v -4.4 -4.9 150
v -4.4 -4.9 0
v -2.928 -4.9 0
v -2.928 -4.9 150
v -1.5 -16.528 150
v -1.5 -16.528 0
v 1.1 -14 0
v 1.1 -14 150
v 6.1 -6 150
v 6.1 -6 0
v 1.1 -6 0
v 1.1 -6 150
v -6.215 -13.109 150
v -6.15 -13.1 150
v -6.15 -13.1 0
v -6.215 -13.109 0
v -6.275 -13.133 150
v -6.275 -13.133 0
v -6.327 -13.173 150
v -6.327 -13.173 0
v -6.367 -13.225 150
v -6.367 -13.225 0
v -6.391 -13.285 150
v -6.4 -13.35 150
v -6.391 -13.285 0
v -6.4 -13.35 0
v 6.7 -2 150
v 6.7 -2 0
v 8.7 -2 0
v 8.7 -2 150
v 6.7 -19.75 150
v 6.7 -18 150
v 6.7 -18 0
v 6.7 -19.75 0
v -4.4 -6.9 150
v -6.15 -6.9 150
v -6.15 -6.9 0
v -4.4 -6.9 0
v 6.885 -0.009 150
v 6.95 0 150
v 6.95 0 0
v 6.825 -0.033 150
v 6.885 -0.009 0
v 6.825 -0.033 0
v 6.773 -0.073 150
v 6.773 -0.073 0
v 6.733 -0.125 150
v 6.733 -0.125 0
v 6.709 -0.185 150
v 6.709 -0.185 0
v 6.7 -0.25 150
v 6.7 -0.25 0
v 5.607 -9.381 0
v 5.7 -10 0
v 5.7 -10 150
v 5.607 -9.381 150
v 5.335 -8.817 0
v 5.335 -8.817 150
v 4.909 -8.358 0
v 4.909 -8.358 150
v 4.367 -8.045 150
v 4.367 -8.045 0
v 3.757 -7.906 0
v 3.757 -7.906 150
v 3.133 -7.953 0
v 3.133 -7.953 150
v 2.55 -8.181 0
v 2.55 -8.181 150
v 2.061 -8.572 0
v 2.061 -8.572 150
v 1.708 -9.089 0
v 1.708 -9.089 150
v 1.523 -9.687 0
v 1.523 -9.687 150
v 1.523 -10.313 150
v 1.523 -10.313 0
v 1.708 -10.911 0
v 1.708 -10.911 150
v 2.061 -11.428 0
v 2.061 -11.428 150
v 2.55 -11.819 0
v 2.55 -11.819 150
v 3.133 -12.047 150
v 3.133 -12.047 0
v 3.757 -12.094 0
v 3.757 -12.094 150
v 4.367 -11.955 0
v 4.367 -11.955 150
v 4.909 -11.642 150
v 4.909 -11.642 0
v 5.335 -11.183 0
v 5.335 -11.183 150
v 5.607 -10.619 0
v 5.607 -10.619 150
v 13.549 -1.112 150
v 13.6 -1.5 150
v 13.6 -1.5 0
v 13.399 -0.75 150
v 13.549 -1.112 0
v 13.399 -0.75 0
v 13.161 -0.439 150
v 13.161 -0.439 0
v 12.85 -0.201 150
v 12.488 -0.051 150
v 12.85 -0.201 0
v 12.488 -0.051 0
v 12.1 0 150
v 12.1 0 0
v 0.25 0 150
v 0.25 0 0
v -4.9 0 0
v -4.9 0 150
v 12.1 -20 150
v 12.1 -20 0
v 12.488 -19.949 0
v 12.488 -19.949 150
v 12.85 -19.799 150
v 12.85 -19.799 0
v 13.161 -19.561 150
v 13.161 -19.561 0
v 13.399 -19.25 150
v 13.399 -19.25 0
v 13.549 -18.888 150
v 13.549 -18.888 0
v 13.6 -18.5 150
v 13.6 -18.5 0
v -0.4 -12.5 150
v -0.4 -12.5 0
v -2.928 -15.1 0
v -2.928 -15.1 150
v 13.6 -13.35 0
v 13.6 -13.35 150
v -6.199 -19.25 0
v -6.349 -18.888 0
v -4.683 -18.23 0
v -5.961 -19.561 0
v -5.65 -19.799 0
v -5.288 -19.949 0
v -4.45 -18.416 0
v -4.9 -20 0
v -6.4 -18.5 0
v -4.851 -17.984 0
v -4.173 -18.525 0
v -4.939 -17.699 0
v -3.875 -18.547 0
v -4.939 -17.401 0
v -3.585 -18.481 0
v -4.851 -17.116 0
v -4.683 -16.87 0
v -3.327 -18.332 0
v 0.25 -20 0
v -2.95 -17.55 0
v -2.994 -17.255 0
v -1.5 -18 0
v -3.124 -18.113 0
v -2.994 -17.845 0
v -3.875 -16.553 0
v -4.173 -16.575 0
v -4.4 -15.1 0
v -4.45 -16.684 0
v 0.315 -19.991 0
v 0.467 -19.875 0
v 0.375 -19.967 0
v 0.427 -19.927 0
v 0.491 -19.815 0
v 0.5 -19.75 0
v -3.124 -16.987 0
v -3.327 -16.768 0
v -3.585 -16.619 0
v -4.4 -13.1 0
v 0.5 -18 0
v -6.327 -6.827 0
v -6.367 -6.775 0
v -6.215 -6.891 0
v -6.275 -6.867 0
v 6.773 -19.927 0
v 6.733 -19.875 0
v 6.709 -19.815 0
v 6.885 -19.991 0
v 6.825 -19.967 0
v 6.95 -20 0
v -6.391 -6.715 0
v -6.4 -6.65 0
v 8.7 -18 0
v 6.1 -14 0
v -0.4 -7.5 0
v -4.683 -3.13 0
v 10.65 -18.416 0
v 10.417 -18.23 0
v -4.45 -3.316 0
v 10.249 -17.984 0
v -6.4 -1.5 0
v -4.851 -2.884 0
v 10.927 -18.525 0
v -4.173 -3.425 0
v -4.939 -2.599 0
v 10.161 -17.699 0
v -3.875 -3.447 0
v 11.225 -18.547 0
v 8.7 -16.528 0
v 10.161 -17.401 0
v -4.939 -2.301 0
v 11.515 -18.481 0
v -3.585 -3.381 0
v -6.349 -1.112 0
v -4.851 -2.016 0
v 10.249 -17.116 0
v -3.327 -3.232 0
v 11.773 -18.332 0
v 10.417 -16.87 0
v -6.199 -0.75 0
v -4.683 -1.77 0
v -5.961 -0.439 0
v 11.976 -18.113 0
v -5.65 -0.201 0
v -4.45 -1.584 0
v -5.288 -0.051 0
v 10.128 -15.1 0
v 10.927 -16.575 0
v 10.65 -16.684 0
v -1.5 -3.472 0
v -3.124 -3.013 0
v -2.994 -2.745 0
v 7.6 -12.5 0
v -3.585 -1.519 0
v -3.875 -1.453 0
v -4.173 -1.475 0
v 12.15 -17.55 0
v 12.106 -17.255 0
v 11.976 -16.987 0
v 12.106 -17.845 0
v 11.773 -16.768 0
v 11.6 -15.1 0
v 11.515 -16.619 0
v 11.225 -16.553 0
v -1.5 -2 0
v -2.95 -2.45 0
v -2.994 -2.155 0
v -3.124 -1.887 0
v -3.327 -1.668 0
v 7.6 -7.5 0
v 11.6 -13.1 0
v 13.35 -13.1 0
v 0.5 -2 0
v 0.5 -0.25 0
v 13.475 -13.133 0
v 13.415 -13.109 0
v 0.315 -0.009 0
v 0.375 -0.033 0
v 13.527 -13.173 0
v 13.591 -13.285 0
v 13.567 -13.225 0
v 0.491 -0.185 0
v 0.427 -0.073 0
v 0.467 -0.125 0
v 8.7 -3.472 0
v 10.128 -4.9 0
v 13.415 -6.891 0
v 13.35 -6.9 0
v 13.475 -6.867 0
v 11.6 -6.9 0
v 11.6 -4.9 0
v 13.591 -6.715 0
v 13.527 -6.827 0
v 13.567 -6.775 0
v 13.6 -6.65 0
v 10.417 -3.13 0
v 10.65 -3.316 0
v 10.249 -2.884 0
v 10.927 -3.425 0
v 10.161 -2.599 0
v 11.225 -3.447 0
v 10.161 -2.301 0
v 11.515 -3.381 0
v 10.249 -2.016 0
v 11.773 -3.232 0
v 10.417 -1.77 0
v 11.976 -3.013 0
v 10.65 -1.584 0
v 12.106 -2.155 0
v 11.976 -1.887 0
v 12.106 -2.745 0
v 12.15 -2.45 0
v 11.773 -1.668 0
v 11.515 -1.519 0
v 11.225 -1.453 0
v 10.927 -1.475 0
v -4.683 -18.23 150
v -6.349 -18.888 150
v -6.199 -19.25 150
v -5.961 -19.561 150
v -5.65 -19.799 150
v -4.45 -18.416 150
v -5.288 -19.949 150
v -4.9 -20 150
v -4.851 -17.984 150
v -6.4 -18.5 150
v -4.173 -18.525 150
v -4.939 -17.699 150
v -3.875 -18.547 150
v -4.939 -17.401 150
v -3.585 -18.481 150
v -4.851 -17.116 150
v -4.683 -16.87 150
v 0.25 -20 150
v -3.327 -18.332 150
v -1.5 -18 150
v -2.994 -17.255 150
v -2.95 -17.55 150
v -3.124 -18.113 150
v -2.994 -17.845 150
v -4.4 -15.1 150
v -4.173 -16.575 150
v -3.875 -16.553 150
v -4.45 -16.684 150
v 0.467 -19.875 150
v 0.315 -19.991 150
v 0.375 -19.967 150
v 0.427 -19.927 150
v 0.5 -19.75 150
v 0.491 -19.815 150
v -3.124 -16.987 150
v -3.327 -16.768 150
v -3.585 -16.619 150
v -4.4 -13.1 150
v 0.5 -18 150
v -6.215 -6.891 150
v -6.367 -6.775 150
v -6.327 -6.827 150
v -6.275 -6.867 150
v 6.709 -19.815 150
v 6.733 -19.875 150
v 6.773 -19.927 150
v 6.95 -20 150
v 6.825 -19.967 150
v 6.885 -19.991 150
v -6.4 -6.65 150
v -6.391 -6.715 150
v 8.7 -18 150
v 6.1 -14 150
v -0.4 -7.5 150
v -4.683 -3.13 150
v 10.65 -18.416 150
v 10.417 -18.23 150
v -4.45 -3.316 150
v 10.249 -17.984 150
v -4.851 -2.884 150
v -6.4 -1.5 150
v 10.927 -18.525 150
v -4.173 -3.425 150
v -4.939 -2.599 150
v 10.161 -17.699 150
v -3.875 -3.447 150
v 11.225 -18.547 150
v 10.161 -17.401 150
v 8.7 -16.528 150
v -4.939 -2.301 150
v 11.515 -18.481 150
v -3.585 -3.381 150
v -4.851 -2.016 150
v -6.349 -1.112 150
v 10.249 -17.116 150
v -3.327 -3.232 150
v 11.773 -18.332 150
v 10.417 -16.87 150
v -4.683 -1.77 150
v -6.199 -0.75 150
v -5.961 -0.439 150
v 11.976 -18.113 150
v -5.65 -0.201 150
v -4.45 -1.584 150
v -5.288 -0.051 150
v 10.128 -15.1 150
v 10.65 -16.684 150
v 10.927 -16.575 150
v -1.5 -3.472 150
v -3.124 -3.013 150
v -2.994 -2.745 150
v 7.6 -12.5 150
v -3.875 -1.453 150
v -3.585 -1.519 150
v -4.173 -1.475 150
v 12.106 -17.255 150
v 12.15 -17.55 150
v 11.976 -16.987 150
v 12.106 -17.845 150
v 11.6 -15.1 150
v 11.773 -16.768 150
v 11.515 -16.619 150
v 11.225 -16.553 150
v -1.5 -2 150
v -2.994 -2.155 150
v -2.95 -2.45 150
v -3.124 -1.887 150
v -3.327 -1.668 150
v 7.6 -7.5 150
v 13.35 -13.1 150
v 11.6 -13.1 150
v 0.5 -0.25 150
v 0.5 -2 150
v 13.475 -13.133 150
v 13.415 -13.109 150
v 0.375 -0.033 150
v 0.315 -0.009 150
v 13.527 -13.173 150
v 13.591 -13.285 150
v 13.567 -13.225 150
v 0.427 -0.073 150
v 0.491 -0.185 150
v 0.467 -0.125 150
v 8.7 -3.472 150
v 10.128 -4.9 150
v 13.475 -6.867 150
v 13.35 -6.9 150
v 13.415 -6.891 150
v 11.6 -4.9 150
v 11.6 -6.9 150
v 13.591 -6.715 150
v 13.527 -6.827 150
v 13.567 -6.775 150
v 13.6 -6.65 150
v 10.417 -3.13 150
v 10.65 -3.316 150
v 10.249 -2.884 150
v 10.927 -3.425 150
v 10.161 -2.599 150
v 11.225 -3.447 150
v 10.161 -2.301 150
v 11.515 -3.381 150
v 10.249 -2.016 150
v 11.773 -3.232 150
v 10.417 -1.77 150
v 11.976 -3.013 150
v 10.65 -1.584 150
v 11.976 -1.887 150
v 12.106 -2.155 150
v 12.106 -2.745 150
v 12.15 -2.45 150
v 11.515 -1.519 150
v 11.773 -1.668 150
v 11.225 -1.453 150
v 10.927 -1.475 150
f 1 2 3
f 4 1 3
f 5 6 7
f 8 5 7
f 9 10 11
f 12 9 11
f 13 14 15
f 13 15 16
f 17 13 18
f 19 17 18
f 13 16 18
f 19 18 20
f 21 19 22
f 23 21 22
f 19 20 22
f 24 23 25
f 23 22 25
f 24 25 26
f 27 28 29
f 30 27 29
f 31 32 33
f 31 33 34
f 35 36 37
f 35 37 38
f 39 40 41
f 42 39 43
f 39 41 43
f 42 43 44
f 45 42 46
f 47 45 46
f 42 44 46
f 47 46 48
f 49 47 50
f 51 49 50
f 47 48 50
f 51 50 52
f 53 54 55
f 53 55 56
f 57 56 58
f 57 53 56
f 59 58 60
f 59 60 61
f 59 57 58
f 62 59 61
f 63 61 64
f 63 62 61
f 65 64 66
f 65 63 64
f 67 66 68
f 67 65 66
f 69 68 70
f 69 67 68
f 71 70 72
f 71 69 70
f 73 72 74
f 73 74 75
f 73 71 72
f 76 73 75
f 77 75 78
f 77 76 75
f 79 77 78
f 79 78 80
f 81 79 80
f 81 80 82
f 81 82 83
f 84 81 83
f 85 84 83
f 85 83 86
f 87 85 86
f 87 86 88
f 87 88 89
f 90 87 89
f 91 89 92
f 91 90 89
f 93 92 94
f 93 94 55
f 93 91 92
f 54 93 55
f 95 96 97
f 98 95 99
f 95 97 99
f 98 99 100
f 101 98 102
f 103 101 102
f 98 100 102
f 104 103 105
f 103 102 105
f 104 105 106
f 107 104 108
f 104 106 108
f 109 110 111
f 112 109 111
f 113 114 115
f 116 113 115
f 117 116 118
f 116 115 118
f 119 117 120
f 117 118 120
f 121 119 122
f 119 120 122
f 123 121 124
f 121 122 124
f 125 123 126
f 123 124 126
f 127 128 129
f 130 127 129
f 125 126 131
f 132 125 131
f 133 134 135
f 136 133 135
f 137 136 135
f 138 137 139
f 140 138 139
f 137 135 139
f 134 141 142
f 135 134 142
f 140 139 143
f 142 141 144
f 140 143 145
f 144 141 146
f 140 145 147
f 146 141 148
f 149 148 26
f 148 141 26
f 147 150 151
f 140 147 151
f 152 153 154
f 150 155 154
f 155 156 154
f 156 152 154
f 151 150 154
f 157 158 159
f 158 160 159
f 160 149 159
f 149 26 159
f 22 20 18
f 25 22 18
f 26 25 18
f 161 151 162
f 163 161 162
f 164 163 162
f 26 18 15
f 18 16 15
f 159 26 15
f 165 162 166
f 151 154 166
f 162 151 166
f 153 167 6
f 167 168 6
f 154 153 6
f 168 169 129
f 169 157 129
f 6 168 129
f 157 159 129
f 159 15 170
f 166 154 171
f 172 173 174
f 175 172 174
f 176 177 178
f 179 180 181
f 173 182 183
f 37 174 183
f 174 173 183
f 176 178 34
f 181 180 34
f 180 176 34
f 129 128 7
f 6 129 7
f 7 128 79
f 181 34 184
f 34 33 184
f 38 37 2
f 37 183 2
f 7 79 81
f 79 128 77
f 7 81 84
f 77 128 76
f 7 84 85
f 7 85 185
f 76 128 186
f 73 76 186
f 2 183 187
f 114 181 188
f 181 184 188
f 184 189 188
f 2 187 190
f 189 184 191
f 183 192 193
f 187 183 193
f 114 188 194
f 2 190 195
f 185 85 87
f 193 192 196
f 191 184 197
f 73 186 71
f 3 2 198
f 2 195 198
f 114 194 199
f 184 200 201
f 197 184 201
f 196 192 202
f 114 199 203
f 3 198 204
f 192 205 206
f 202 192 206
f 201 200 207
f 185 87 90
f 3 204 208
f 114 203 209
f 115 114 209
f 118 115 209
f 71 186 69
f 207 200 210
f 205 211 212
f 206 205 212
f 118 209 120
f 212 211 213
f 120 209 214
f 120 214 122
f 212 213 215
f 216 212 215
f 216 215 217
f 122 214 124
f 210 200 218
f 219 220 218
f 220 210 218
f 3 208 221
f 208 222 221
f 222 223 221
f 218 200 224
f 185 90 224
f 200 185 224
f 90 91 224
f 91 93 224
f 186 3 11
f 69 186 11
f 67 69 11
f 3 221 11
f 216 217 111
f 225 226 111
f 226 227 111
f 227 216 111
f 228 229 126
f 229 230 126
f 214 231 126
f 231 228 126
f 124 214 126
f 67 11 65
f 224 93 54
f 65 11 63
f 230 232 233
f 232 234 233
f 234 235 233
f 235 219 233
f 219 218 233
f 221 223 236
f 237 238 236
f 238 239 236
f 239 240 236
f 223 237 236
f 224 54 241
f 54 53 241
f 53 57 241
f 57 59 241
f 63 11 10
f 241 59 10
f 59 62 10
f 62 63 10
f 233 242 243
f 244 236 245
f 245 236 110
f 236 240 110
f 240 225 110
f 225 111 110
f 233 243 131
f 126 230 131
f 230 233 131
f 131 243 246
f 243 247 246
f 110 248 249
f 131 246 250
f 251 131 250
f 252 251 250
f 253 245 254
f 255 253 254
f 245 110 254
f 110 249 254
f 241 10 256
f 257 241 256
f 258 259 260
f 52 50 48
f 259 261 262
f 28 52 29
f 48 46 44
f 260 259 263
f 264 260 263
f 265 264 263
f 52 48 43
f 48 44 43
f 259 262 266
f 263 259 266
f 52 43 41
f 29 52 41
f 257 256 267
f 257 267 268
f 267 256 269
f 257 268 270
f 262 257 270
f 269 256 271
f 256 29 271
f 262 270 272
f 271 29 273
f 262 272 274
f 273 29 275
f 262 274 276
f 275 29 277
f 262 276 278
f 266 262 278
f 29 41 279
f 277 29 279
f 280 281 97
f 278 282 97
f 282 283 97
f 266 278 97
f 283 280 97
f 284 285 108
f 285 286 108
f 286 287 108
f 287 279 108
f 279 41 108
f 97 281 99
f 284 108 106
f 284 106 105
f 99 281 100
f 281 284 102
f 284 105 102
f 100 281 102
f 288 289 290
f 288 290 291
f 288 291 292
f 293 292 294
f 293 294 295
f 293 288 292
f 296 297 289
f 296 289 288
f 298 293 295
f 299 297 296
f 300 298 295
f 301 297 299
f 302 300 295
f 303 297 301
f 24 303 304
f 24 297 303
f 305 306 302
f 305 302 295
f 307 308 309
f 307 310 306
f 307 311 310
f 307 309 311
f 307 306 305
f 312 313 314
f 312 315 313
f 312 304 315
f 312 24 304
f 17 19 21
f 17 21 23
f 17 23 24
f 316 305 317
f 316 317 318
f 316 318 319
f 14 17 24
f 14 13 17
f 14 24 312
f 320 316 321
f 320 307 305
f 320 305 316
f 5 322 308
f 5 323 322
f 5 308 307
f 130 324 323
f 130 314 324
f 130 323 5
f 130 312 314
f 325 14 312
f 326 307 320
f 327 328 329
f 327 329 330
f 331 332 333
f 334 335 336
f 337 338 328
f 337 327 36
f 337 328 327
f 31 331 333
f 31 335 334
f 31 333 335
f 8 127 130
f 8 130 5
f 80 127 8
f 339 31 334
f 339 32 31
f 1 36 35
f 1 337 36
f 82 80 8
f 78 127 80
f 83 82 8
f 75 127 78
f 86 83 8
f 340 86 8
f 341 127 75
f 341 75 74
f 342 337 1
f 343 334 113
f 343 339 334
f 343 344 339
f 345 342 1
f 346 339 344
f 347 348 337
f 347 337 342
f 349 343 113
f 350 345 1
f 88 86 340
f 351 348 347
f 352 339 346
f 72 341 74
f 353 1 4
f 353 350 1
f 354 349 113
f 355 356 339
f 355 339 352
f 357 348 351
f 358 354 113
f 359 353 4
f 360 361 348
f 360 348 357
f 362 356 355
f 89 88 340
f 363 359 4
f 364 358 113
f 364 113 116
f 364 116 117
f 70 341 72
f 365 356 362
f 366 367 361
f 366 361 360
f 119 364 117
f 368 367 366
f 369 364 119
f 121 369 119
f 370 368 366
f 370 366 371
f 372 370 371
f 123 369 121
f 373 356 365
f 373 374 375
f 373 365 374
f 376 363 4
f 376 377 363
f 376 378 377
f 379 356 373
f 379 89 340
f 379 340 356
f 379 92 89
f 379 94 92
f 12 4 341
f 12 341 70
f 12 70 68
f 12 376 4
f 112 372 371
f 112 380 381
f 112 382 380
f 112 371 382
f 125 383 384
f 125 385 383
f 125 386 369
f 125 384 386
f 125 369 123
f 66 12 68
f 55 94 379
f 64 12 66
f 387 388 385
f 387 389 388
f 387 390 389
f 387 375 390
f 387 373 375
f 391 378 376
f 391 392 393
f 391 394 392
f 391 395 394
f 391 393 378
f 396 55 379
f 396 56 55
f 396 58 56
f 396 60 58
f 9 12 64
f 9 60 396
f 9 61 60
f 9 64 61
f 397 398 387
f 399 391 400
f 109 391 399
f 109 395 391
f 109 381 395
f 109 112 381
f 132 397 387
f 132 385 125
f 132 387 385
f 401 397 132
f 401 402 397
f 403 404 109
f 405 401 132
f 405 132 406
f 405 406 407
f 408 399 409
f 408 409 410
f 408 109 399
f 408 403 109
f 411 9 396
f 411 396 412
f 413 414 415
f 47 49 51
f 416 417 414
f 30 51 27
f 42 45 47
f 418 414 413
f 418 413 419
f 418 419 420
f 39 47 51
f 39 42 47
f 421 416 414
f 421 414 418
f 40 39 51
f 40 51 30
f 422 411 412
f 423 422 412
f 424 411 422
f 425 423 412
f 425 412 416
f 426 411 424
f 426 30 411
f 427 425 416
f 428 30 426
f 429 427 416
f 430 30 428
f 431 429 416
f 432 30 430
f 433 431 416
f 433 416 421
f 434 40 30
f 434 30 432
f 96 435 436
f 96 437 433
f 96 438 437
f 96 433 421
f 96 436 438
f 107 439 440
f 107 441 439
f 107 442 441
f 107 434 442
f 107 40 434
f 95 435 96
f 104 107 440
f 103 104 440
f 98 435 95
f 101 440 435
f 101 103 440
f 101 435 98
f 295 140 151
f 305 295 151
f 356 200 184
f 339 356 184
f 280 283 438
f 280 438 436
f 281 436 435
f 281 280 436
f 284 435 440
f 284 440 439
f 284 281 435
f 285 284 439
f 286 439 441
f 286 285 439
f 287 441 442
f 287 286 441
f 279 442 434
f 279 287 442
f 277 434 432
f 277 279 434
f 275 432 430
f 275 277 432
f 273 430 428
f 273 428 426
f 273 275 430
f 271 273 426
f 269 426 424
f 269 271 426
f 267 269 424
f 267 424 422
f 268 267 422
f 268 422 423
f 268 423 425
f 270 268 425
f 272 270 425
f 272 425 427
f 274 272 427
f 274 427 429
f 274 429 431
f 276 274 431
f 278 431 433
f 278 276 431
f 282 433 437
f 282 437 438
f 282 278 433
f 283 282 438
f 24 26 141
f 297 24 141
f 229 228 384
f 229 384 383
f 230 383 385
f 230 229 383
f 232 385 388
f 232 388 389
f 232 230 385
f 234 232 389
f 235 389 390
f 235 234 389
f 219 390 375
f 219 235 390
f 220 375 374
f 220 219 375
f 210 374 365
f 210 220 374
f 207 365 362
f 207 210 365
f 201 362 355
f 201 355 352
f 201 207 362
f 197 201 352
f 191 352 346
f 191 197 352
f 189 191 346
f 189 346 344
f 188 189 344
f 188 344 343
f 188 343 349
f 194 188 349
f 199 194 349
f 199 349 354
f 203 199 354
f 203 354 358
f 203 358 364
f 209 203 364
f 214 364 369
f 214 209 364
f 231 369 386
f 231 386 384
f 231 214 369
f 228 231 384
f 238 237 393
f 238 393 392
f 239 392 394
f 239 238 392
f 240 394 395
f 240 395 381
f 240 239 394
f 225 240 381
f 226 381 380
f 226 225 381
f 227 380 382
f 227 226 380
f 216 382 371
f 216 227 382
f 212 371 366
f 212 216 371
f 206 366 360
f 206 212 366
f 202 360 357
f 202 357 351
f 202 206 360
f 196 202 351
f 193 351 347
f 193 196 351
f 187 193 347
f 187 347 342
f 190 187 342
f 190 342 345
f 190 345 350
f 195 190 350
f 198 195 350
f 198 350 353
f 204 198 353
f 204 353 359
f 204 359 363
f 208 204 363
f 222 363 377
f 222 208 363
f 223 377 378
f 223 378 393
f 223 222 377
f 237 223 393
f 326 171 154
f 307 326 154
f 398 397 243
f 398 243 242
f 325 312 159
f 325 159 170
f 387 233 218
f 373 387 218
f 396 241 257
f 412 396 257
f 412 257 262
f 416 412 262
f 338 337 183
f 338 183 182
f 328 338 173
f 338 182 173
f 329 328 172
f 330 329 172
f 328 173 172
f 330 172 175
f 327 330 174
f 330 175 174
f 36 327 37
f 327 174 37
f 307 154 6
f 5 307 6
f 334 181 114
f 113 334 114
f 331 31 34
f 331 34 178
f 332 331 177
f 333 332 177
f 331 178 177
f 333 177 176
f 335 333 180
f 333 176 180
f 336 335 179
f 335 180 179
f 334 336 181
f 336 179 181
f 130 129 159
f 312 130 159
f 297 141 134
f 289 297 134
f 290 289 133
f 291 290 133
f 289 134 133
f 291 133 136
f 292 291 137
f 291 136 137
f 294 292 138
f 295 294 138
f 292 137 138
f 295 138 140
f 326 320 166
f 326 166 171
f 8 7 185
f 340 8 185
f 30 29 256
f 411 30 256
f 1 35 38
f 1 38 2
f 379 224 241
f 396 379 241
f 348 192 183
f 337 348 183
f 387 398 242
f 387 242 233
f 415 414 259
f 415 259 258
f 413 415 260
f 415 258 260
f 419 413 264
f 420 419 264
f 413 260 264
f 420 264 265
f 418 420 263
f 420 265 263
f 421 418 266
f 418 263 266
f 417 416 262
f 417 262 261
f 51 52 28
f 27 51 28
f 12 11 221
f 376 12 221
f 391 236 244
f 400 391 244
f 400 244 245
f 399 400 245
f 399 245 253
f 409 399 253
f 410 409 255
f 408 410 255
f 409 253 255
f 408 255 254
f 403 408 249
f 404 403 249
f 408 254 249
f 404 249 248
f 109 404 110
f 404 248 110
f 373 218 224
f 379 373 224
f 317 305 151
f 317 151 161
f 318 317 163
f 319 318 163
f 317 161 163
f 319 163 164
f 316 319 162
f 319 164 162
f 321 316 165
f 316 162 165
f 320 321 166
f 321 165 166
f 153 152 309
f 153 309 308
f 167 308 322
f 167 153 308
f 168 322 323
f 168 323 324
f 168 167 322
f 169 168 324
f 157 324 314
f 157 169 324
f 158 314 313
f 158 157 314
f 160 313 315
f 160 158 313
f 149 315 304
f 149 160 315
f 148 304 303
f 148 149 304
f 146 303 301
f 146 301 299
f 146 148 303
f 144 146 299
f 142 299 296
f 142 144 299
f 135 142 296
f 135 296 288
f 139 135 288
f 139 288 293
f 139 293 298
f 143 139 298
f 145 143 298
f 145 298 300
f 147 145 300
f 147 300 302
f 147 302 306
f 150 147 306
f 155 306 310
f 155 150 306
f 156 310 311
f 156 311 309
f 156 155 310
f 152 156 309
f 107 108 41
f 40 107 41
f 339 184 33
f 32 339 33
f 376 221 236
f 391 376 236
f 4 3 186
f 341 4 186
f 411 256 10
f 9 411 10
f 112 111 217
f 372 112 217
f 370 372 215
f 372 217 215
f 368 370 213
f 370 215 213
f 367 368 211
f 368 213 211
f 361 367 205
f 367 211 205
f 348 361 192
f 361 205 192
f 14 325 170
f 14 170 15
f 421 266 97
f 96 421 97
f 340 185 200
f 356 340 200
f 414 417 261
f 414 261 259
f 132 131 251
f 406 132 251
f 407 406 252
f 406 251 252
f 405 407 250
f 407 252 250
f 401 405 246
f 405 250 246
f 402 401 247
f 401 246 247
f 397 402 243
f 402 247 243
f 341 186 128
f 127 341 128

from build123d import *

# Parameters (mm, degrees)
SKETCH1_R           = 1
SKETCH1_R_2         = 2.1
BOSS_EXTRUDE2_DEPTH = 150


with BuildPart() as part:
    # Sketch1 → Boss-Extrude2 (new body)
    with BuildSketch(Plane.XY):
        with BuildLine():
            Line((-6.4, -1.5), (-6.4, -6.65))
            ThreePointArc((-6.4, -6.65), (-6.326776695, -6.826776695), (-6.15, -6.9))
            Line((-6.15, -6.9), (-4.4, -6.9))
            Line((-4.4, -6.9), (-4.4, -4.9))
            Line((-4.4, -4.9), (-2.927777778, -4.9))
            Line((-2.927777778, -4.9), (-0.4, -7.5))
            Line((-0.4, -7.5), (-0.4, -12.5))
            Line((-0.4, -12.5), (-2.927777778, -15.1))
            Line((-2.927777778, -15.1), (-4.4, -15.1))
            Line((-4.4, -15.1), (-4.4, -13.1))
            Line((-4.4, -13.1), (-6.15, -13.1))
            ThreePointArc((-6.15, -13.1), (-6.326776695, -13.173223305), (-6.4, -13.35))
            Line((-6.4, -13.35), (-6.4, -18.5))
            ThreePointArc((-6.4, -18.5), (-5.960660172, -19.560660172), (-4.9, -20))
            Line((-4.9, -20), (0.25, -20))
            ThreePointArc((0.25, -20), (0.426776695, -19.926776695), (0.5, -19.75))
            Line((0.5, -19.75), (0.5, -18))
            Line((0.5, -18), (-1.5, -18))
            Line((-1.5, -18), (-1.5, -16.527777778))
            Line((-1.5, -16.527777778), (1.1, -14))
            Line((1.1, -14), (6.1, -14))
            Line((6.1, -14), (8.7, -16.527777778))
            Line((8.7, -16.527777778), (8.7, -18))
            Line((8.7, -18), (6.7, -18))
            Line((6.7, -18), (6.7, -19.75))
            ThreePointArc((6.7, -19.75), (6.773223305, -19.926776695), (6.95, -20))
            Line((6.95, -20), (12.1, -20))
            ThreePointArc((12.1, -20), (13.160660172, -19.560660172), (13.6, -18.5))
            Line((13.6, -18.5), (13.6, -13.35))
            ThreePointArc((13.6, -13.35), (13.526776695, -13.173223305), (13.35, -13.1))
            Line((13.35, -13.1), (11.6, -13.1))
            Line((11.6, -13.1), (11.6, -15.1))
            Line((11.6, -15.1), (10.127777778, -15.1))
            Line((10.127777778, -15.1), (7.6, -12.5))
            Line((7.6, -12.5), (7.6, -7.5))
            Line((7.6, -7.5), (10.127777778, -4.9))
            Line((10.127777778, -4.9), (11.6, -4.9))
            Line((11.6, -4.9), (11.6, -6.9))
            Line((11.6, -6.9), (13.35, -6.9))
            ThreePointArc((13.35, -6.9), (13.526776695, -6.826776695), (13.6, -6.65))
            Line((13.6, -6.65), (13.6, -1.5))
            ThreePointArc((13.6, -1.5), (13.160660172, -0.439339828), (12.1, 0))
            Line((12.1, 0), (6.95, 0))
            ThreePointArc((6.95, 0), (6.773223305, -0.073223305), (6.7, -0.25))
            Line((6.7, -0.25), (6.7, -2))
            Line((6.7, -2), (8.7, -2))
            Line((8.7, -2), (8.7, -3.472222222))
            Line((8.7, -3.472222222), (6.1, -6))
            Line((6.1, -6), (1.1, -6))
            Line((1.1, -6), (-1.5, -3.472222222))
            Line((-1.5, -3.472222222), (-1.5, -2))
            Line((-1.5, -2), (0.5, -2))
            Line((0.5, -2), (0.5, -0.25))
            ThreePointArc((0.5, -0.25), (0.426776695, -0.073223305), (0.25, 0))
            Line((0.25, 0), (-4.9, 0))
            ThreePointArc((-4.9, 0), (-5.960660172, -0.439339828), (-6.4, -1.5))
        make_face()
        with Locations((-3.95, -2.45)):
            Circle(SKETCH1_R, mode=Mode.SUBTRACT)
        with Locations((11.15, -2.45)):
            Circle(SKETCH1_R, mode=Mode.SUBTRACT)
        with Locations((-3.95, -17.55)):
            Circle(SKETCH1_R, mode=Mode.SUBTRACT)
        with Locations((11.15, -17.55)):
            Circle(SKETCH1_R, mode=Mode.SUBTRACT)
        with Locations((3.6, -10)):
            Circle(SKETCH1_R_2, mode=Mode.SUBTRACT)
    extrude(amount=BOSS_EXTRUDE2_DEPTH)


solid = part.part
